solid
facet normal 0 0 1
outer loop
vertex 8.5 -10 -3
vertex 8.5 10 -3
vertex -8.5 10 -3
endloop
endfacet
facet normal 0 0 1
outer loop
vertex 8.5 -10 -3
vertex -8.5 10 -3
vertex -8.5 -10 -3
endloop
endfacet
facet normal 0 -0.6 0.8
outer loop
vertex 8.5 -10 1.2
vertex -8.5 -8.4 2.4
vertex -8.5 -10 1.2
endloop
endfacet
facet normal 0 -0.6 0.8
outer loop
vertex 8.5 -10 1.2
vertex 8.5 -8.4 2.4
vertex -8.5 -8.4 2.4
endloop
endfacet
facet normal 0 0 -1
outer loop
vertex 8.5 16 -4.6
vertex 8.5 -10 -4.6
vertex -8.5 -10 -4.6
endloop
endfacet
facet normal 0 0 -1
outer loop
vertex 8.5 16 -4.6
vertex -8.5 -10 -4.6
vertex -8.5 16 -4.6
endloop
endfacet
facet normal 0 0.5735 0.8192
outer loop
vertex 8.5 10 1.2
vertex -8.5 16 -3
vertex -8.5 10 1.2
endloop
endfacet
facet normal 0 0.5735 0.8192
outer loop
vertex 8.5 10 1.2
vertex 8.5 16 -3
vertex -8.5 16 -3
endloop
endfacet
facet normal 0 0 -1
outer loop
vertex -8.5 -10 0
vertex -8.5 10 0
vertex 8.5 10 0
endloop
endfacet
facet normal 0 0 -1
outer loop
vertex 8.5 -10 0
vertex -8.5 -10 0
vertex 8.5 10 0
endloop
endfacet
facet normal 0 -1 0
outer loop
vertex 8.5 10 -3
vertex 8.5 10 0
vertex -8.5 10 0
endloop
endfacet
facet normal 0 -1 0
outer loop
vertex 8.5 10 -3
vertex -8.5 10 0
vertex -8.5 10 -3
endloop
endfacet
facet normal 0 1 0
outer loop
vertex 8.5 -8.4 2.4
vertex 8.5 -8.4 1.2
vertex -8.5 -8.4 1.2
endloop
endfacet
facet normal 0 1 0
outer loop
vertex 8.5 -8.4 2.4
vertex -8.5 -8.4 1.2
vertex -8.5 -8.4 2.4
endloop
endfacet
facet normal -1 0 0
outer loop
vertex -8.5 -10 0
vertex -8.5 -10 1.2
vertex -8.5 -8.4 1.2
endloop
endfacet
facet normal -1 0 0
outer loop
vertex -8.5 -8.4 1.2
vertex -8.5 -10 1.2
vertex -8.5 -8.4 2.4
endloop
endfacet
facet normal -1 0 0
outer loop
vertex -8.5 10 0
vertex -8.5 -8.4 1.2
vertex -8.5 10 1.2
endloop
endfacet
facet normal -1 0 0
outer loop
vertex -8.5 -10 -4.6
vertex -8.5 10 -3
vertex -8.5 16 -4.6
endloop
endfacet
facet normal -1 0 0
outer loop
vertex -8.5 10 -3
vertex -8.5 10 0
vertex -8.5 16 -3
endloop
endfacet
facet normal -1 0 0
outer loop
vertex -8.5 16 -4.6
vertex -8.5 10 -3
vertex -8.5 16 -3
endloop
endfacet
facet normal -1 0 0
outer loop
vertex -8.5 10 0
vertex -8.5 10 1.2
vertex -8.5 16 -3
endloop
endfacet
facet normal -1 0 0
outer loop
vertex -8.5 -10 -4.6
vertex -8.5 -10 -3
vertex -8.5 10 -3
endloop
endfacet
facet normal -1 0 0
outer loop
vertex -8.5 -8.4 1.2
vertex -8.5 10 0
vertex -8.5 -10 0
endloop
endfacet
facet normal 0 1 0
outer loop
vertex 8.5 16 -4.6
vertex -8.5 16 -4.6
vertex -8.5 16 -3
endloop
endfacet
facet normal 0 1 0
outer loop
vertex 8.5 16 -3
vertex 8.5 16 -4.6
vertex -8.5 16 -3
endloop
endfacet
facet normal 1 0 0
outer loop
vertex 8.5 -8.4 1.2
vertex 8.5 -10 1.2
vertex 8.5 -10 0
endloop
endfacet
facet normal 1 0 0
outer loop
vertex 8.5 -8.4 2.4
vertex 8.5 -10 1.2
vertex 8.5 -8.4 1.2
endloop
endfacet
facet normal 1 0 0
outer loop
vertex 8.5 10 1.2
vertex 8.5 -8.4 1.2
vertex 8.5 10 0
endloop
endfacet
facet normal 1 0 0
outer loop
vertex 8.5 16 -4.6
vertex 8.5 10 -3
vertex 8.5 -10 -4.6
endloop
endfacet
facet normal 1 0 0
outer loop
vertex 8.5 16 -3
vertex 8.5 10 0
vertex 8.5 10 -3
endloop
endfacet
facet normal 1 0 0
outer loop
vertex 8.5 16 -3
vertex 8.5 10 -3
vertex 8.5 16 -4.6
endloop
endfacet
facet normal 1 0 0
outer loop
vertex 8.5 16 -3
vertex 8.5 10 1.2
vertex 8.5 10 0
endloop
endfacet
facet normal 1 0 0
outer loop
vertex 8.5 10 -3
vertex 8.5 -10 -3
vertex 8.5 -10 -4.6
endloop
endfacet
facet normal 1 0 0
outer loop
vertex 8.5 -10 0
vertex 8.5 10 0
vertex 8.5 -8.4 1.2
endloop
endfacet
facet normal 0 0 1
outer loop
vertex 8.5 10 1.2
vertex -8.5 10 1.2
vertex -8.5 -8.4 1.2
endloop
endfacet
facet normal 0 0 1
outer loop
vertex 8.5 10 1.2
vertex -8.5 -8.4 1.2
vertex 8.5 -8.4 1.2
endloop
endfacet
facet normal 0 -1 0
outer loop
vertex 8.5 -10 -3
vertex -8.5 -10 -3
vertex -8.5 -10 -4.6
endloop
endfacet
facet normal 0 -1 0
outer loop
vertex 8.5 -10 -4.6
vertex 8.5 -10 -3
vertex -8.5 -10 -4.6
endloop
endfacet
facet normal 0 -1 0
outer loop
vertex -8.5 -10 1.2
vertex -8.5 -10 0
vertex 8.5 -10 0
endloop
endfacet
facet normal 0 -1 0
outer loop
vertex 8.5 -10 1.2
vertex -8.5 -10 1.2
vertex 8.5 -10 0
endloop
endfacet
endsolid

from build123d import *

# Parameters (mm, degrees)
F0_W     = 17
F0_H     = 20
F1_DEPTH = 1.2
F3_DEPTH = 8.5
F5_DEPTH = 8.5


with BuildPart() as f1:
    # F0 (on Top) → F1 (new body)
    with BuildSketch(Plane.XY):
        Rectangle(F0_W, F0_H)
    extrude(amount=F1_DEPTH)

    # F2 (on Right) → F3 (join, symmetric)
    with BuildSketch(Plane.YZ):
        Polygon((-10, 1.2), (-8.4, 1.2), (-8.4, 2.4), align=None)
    extrude(amount=F3_DEPTH, both=True)

    # F4 (on Right) → F5 (join, symmetric)
    with BuildSketch(Plane.YZ):
        Polygon((10, 1.2), (10, 0), (10, -3), (-10, -3), (-10, -4.6), (16, -4.6), (16, -3), align=None)
    extrude(amount=F5_DEPTH, both=True)


solid = f1.part
